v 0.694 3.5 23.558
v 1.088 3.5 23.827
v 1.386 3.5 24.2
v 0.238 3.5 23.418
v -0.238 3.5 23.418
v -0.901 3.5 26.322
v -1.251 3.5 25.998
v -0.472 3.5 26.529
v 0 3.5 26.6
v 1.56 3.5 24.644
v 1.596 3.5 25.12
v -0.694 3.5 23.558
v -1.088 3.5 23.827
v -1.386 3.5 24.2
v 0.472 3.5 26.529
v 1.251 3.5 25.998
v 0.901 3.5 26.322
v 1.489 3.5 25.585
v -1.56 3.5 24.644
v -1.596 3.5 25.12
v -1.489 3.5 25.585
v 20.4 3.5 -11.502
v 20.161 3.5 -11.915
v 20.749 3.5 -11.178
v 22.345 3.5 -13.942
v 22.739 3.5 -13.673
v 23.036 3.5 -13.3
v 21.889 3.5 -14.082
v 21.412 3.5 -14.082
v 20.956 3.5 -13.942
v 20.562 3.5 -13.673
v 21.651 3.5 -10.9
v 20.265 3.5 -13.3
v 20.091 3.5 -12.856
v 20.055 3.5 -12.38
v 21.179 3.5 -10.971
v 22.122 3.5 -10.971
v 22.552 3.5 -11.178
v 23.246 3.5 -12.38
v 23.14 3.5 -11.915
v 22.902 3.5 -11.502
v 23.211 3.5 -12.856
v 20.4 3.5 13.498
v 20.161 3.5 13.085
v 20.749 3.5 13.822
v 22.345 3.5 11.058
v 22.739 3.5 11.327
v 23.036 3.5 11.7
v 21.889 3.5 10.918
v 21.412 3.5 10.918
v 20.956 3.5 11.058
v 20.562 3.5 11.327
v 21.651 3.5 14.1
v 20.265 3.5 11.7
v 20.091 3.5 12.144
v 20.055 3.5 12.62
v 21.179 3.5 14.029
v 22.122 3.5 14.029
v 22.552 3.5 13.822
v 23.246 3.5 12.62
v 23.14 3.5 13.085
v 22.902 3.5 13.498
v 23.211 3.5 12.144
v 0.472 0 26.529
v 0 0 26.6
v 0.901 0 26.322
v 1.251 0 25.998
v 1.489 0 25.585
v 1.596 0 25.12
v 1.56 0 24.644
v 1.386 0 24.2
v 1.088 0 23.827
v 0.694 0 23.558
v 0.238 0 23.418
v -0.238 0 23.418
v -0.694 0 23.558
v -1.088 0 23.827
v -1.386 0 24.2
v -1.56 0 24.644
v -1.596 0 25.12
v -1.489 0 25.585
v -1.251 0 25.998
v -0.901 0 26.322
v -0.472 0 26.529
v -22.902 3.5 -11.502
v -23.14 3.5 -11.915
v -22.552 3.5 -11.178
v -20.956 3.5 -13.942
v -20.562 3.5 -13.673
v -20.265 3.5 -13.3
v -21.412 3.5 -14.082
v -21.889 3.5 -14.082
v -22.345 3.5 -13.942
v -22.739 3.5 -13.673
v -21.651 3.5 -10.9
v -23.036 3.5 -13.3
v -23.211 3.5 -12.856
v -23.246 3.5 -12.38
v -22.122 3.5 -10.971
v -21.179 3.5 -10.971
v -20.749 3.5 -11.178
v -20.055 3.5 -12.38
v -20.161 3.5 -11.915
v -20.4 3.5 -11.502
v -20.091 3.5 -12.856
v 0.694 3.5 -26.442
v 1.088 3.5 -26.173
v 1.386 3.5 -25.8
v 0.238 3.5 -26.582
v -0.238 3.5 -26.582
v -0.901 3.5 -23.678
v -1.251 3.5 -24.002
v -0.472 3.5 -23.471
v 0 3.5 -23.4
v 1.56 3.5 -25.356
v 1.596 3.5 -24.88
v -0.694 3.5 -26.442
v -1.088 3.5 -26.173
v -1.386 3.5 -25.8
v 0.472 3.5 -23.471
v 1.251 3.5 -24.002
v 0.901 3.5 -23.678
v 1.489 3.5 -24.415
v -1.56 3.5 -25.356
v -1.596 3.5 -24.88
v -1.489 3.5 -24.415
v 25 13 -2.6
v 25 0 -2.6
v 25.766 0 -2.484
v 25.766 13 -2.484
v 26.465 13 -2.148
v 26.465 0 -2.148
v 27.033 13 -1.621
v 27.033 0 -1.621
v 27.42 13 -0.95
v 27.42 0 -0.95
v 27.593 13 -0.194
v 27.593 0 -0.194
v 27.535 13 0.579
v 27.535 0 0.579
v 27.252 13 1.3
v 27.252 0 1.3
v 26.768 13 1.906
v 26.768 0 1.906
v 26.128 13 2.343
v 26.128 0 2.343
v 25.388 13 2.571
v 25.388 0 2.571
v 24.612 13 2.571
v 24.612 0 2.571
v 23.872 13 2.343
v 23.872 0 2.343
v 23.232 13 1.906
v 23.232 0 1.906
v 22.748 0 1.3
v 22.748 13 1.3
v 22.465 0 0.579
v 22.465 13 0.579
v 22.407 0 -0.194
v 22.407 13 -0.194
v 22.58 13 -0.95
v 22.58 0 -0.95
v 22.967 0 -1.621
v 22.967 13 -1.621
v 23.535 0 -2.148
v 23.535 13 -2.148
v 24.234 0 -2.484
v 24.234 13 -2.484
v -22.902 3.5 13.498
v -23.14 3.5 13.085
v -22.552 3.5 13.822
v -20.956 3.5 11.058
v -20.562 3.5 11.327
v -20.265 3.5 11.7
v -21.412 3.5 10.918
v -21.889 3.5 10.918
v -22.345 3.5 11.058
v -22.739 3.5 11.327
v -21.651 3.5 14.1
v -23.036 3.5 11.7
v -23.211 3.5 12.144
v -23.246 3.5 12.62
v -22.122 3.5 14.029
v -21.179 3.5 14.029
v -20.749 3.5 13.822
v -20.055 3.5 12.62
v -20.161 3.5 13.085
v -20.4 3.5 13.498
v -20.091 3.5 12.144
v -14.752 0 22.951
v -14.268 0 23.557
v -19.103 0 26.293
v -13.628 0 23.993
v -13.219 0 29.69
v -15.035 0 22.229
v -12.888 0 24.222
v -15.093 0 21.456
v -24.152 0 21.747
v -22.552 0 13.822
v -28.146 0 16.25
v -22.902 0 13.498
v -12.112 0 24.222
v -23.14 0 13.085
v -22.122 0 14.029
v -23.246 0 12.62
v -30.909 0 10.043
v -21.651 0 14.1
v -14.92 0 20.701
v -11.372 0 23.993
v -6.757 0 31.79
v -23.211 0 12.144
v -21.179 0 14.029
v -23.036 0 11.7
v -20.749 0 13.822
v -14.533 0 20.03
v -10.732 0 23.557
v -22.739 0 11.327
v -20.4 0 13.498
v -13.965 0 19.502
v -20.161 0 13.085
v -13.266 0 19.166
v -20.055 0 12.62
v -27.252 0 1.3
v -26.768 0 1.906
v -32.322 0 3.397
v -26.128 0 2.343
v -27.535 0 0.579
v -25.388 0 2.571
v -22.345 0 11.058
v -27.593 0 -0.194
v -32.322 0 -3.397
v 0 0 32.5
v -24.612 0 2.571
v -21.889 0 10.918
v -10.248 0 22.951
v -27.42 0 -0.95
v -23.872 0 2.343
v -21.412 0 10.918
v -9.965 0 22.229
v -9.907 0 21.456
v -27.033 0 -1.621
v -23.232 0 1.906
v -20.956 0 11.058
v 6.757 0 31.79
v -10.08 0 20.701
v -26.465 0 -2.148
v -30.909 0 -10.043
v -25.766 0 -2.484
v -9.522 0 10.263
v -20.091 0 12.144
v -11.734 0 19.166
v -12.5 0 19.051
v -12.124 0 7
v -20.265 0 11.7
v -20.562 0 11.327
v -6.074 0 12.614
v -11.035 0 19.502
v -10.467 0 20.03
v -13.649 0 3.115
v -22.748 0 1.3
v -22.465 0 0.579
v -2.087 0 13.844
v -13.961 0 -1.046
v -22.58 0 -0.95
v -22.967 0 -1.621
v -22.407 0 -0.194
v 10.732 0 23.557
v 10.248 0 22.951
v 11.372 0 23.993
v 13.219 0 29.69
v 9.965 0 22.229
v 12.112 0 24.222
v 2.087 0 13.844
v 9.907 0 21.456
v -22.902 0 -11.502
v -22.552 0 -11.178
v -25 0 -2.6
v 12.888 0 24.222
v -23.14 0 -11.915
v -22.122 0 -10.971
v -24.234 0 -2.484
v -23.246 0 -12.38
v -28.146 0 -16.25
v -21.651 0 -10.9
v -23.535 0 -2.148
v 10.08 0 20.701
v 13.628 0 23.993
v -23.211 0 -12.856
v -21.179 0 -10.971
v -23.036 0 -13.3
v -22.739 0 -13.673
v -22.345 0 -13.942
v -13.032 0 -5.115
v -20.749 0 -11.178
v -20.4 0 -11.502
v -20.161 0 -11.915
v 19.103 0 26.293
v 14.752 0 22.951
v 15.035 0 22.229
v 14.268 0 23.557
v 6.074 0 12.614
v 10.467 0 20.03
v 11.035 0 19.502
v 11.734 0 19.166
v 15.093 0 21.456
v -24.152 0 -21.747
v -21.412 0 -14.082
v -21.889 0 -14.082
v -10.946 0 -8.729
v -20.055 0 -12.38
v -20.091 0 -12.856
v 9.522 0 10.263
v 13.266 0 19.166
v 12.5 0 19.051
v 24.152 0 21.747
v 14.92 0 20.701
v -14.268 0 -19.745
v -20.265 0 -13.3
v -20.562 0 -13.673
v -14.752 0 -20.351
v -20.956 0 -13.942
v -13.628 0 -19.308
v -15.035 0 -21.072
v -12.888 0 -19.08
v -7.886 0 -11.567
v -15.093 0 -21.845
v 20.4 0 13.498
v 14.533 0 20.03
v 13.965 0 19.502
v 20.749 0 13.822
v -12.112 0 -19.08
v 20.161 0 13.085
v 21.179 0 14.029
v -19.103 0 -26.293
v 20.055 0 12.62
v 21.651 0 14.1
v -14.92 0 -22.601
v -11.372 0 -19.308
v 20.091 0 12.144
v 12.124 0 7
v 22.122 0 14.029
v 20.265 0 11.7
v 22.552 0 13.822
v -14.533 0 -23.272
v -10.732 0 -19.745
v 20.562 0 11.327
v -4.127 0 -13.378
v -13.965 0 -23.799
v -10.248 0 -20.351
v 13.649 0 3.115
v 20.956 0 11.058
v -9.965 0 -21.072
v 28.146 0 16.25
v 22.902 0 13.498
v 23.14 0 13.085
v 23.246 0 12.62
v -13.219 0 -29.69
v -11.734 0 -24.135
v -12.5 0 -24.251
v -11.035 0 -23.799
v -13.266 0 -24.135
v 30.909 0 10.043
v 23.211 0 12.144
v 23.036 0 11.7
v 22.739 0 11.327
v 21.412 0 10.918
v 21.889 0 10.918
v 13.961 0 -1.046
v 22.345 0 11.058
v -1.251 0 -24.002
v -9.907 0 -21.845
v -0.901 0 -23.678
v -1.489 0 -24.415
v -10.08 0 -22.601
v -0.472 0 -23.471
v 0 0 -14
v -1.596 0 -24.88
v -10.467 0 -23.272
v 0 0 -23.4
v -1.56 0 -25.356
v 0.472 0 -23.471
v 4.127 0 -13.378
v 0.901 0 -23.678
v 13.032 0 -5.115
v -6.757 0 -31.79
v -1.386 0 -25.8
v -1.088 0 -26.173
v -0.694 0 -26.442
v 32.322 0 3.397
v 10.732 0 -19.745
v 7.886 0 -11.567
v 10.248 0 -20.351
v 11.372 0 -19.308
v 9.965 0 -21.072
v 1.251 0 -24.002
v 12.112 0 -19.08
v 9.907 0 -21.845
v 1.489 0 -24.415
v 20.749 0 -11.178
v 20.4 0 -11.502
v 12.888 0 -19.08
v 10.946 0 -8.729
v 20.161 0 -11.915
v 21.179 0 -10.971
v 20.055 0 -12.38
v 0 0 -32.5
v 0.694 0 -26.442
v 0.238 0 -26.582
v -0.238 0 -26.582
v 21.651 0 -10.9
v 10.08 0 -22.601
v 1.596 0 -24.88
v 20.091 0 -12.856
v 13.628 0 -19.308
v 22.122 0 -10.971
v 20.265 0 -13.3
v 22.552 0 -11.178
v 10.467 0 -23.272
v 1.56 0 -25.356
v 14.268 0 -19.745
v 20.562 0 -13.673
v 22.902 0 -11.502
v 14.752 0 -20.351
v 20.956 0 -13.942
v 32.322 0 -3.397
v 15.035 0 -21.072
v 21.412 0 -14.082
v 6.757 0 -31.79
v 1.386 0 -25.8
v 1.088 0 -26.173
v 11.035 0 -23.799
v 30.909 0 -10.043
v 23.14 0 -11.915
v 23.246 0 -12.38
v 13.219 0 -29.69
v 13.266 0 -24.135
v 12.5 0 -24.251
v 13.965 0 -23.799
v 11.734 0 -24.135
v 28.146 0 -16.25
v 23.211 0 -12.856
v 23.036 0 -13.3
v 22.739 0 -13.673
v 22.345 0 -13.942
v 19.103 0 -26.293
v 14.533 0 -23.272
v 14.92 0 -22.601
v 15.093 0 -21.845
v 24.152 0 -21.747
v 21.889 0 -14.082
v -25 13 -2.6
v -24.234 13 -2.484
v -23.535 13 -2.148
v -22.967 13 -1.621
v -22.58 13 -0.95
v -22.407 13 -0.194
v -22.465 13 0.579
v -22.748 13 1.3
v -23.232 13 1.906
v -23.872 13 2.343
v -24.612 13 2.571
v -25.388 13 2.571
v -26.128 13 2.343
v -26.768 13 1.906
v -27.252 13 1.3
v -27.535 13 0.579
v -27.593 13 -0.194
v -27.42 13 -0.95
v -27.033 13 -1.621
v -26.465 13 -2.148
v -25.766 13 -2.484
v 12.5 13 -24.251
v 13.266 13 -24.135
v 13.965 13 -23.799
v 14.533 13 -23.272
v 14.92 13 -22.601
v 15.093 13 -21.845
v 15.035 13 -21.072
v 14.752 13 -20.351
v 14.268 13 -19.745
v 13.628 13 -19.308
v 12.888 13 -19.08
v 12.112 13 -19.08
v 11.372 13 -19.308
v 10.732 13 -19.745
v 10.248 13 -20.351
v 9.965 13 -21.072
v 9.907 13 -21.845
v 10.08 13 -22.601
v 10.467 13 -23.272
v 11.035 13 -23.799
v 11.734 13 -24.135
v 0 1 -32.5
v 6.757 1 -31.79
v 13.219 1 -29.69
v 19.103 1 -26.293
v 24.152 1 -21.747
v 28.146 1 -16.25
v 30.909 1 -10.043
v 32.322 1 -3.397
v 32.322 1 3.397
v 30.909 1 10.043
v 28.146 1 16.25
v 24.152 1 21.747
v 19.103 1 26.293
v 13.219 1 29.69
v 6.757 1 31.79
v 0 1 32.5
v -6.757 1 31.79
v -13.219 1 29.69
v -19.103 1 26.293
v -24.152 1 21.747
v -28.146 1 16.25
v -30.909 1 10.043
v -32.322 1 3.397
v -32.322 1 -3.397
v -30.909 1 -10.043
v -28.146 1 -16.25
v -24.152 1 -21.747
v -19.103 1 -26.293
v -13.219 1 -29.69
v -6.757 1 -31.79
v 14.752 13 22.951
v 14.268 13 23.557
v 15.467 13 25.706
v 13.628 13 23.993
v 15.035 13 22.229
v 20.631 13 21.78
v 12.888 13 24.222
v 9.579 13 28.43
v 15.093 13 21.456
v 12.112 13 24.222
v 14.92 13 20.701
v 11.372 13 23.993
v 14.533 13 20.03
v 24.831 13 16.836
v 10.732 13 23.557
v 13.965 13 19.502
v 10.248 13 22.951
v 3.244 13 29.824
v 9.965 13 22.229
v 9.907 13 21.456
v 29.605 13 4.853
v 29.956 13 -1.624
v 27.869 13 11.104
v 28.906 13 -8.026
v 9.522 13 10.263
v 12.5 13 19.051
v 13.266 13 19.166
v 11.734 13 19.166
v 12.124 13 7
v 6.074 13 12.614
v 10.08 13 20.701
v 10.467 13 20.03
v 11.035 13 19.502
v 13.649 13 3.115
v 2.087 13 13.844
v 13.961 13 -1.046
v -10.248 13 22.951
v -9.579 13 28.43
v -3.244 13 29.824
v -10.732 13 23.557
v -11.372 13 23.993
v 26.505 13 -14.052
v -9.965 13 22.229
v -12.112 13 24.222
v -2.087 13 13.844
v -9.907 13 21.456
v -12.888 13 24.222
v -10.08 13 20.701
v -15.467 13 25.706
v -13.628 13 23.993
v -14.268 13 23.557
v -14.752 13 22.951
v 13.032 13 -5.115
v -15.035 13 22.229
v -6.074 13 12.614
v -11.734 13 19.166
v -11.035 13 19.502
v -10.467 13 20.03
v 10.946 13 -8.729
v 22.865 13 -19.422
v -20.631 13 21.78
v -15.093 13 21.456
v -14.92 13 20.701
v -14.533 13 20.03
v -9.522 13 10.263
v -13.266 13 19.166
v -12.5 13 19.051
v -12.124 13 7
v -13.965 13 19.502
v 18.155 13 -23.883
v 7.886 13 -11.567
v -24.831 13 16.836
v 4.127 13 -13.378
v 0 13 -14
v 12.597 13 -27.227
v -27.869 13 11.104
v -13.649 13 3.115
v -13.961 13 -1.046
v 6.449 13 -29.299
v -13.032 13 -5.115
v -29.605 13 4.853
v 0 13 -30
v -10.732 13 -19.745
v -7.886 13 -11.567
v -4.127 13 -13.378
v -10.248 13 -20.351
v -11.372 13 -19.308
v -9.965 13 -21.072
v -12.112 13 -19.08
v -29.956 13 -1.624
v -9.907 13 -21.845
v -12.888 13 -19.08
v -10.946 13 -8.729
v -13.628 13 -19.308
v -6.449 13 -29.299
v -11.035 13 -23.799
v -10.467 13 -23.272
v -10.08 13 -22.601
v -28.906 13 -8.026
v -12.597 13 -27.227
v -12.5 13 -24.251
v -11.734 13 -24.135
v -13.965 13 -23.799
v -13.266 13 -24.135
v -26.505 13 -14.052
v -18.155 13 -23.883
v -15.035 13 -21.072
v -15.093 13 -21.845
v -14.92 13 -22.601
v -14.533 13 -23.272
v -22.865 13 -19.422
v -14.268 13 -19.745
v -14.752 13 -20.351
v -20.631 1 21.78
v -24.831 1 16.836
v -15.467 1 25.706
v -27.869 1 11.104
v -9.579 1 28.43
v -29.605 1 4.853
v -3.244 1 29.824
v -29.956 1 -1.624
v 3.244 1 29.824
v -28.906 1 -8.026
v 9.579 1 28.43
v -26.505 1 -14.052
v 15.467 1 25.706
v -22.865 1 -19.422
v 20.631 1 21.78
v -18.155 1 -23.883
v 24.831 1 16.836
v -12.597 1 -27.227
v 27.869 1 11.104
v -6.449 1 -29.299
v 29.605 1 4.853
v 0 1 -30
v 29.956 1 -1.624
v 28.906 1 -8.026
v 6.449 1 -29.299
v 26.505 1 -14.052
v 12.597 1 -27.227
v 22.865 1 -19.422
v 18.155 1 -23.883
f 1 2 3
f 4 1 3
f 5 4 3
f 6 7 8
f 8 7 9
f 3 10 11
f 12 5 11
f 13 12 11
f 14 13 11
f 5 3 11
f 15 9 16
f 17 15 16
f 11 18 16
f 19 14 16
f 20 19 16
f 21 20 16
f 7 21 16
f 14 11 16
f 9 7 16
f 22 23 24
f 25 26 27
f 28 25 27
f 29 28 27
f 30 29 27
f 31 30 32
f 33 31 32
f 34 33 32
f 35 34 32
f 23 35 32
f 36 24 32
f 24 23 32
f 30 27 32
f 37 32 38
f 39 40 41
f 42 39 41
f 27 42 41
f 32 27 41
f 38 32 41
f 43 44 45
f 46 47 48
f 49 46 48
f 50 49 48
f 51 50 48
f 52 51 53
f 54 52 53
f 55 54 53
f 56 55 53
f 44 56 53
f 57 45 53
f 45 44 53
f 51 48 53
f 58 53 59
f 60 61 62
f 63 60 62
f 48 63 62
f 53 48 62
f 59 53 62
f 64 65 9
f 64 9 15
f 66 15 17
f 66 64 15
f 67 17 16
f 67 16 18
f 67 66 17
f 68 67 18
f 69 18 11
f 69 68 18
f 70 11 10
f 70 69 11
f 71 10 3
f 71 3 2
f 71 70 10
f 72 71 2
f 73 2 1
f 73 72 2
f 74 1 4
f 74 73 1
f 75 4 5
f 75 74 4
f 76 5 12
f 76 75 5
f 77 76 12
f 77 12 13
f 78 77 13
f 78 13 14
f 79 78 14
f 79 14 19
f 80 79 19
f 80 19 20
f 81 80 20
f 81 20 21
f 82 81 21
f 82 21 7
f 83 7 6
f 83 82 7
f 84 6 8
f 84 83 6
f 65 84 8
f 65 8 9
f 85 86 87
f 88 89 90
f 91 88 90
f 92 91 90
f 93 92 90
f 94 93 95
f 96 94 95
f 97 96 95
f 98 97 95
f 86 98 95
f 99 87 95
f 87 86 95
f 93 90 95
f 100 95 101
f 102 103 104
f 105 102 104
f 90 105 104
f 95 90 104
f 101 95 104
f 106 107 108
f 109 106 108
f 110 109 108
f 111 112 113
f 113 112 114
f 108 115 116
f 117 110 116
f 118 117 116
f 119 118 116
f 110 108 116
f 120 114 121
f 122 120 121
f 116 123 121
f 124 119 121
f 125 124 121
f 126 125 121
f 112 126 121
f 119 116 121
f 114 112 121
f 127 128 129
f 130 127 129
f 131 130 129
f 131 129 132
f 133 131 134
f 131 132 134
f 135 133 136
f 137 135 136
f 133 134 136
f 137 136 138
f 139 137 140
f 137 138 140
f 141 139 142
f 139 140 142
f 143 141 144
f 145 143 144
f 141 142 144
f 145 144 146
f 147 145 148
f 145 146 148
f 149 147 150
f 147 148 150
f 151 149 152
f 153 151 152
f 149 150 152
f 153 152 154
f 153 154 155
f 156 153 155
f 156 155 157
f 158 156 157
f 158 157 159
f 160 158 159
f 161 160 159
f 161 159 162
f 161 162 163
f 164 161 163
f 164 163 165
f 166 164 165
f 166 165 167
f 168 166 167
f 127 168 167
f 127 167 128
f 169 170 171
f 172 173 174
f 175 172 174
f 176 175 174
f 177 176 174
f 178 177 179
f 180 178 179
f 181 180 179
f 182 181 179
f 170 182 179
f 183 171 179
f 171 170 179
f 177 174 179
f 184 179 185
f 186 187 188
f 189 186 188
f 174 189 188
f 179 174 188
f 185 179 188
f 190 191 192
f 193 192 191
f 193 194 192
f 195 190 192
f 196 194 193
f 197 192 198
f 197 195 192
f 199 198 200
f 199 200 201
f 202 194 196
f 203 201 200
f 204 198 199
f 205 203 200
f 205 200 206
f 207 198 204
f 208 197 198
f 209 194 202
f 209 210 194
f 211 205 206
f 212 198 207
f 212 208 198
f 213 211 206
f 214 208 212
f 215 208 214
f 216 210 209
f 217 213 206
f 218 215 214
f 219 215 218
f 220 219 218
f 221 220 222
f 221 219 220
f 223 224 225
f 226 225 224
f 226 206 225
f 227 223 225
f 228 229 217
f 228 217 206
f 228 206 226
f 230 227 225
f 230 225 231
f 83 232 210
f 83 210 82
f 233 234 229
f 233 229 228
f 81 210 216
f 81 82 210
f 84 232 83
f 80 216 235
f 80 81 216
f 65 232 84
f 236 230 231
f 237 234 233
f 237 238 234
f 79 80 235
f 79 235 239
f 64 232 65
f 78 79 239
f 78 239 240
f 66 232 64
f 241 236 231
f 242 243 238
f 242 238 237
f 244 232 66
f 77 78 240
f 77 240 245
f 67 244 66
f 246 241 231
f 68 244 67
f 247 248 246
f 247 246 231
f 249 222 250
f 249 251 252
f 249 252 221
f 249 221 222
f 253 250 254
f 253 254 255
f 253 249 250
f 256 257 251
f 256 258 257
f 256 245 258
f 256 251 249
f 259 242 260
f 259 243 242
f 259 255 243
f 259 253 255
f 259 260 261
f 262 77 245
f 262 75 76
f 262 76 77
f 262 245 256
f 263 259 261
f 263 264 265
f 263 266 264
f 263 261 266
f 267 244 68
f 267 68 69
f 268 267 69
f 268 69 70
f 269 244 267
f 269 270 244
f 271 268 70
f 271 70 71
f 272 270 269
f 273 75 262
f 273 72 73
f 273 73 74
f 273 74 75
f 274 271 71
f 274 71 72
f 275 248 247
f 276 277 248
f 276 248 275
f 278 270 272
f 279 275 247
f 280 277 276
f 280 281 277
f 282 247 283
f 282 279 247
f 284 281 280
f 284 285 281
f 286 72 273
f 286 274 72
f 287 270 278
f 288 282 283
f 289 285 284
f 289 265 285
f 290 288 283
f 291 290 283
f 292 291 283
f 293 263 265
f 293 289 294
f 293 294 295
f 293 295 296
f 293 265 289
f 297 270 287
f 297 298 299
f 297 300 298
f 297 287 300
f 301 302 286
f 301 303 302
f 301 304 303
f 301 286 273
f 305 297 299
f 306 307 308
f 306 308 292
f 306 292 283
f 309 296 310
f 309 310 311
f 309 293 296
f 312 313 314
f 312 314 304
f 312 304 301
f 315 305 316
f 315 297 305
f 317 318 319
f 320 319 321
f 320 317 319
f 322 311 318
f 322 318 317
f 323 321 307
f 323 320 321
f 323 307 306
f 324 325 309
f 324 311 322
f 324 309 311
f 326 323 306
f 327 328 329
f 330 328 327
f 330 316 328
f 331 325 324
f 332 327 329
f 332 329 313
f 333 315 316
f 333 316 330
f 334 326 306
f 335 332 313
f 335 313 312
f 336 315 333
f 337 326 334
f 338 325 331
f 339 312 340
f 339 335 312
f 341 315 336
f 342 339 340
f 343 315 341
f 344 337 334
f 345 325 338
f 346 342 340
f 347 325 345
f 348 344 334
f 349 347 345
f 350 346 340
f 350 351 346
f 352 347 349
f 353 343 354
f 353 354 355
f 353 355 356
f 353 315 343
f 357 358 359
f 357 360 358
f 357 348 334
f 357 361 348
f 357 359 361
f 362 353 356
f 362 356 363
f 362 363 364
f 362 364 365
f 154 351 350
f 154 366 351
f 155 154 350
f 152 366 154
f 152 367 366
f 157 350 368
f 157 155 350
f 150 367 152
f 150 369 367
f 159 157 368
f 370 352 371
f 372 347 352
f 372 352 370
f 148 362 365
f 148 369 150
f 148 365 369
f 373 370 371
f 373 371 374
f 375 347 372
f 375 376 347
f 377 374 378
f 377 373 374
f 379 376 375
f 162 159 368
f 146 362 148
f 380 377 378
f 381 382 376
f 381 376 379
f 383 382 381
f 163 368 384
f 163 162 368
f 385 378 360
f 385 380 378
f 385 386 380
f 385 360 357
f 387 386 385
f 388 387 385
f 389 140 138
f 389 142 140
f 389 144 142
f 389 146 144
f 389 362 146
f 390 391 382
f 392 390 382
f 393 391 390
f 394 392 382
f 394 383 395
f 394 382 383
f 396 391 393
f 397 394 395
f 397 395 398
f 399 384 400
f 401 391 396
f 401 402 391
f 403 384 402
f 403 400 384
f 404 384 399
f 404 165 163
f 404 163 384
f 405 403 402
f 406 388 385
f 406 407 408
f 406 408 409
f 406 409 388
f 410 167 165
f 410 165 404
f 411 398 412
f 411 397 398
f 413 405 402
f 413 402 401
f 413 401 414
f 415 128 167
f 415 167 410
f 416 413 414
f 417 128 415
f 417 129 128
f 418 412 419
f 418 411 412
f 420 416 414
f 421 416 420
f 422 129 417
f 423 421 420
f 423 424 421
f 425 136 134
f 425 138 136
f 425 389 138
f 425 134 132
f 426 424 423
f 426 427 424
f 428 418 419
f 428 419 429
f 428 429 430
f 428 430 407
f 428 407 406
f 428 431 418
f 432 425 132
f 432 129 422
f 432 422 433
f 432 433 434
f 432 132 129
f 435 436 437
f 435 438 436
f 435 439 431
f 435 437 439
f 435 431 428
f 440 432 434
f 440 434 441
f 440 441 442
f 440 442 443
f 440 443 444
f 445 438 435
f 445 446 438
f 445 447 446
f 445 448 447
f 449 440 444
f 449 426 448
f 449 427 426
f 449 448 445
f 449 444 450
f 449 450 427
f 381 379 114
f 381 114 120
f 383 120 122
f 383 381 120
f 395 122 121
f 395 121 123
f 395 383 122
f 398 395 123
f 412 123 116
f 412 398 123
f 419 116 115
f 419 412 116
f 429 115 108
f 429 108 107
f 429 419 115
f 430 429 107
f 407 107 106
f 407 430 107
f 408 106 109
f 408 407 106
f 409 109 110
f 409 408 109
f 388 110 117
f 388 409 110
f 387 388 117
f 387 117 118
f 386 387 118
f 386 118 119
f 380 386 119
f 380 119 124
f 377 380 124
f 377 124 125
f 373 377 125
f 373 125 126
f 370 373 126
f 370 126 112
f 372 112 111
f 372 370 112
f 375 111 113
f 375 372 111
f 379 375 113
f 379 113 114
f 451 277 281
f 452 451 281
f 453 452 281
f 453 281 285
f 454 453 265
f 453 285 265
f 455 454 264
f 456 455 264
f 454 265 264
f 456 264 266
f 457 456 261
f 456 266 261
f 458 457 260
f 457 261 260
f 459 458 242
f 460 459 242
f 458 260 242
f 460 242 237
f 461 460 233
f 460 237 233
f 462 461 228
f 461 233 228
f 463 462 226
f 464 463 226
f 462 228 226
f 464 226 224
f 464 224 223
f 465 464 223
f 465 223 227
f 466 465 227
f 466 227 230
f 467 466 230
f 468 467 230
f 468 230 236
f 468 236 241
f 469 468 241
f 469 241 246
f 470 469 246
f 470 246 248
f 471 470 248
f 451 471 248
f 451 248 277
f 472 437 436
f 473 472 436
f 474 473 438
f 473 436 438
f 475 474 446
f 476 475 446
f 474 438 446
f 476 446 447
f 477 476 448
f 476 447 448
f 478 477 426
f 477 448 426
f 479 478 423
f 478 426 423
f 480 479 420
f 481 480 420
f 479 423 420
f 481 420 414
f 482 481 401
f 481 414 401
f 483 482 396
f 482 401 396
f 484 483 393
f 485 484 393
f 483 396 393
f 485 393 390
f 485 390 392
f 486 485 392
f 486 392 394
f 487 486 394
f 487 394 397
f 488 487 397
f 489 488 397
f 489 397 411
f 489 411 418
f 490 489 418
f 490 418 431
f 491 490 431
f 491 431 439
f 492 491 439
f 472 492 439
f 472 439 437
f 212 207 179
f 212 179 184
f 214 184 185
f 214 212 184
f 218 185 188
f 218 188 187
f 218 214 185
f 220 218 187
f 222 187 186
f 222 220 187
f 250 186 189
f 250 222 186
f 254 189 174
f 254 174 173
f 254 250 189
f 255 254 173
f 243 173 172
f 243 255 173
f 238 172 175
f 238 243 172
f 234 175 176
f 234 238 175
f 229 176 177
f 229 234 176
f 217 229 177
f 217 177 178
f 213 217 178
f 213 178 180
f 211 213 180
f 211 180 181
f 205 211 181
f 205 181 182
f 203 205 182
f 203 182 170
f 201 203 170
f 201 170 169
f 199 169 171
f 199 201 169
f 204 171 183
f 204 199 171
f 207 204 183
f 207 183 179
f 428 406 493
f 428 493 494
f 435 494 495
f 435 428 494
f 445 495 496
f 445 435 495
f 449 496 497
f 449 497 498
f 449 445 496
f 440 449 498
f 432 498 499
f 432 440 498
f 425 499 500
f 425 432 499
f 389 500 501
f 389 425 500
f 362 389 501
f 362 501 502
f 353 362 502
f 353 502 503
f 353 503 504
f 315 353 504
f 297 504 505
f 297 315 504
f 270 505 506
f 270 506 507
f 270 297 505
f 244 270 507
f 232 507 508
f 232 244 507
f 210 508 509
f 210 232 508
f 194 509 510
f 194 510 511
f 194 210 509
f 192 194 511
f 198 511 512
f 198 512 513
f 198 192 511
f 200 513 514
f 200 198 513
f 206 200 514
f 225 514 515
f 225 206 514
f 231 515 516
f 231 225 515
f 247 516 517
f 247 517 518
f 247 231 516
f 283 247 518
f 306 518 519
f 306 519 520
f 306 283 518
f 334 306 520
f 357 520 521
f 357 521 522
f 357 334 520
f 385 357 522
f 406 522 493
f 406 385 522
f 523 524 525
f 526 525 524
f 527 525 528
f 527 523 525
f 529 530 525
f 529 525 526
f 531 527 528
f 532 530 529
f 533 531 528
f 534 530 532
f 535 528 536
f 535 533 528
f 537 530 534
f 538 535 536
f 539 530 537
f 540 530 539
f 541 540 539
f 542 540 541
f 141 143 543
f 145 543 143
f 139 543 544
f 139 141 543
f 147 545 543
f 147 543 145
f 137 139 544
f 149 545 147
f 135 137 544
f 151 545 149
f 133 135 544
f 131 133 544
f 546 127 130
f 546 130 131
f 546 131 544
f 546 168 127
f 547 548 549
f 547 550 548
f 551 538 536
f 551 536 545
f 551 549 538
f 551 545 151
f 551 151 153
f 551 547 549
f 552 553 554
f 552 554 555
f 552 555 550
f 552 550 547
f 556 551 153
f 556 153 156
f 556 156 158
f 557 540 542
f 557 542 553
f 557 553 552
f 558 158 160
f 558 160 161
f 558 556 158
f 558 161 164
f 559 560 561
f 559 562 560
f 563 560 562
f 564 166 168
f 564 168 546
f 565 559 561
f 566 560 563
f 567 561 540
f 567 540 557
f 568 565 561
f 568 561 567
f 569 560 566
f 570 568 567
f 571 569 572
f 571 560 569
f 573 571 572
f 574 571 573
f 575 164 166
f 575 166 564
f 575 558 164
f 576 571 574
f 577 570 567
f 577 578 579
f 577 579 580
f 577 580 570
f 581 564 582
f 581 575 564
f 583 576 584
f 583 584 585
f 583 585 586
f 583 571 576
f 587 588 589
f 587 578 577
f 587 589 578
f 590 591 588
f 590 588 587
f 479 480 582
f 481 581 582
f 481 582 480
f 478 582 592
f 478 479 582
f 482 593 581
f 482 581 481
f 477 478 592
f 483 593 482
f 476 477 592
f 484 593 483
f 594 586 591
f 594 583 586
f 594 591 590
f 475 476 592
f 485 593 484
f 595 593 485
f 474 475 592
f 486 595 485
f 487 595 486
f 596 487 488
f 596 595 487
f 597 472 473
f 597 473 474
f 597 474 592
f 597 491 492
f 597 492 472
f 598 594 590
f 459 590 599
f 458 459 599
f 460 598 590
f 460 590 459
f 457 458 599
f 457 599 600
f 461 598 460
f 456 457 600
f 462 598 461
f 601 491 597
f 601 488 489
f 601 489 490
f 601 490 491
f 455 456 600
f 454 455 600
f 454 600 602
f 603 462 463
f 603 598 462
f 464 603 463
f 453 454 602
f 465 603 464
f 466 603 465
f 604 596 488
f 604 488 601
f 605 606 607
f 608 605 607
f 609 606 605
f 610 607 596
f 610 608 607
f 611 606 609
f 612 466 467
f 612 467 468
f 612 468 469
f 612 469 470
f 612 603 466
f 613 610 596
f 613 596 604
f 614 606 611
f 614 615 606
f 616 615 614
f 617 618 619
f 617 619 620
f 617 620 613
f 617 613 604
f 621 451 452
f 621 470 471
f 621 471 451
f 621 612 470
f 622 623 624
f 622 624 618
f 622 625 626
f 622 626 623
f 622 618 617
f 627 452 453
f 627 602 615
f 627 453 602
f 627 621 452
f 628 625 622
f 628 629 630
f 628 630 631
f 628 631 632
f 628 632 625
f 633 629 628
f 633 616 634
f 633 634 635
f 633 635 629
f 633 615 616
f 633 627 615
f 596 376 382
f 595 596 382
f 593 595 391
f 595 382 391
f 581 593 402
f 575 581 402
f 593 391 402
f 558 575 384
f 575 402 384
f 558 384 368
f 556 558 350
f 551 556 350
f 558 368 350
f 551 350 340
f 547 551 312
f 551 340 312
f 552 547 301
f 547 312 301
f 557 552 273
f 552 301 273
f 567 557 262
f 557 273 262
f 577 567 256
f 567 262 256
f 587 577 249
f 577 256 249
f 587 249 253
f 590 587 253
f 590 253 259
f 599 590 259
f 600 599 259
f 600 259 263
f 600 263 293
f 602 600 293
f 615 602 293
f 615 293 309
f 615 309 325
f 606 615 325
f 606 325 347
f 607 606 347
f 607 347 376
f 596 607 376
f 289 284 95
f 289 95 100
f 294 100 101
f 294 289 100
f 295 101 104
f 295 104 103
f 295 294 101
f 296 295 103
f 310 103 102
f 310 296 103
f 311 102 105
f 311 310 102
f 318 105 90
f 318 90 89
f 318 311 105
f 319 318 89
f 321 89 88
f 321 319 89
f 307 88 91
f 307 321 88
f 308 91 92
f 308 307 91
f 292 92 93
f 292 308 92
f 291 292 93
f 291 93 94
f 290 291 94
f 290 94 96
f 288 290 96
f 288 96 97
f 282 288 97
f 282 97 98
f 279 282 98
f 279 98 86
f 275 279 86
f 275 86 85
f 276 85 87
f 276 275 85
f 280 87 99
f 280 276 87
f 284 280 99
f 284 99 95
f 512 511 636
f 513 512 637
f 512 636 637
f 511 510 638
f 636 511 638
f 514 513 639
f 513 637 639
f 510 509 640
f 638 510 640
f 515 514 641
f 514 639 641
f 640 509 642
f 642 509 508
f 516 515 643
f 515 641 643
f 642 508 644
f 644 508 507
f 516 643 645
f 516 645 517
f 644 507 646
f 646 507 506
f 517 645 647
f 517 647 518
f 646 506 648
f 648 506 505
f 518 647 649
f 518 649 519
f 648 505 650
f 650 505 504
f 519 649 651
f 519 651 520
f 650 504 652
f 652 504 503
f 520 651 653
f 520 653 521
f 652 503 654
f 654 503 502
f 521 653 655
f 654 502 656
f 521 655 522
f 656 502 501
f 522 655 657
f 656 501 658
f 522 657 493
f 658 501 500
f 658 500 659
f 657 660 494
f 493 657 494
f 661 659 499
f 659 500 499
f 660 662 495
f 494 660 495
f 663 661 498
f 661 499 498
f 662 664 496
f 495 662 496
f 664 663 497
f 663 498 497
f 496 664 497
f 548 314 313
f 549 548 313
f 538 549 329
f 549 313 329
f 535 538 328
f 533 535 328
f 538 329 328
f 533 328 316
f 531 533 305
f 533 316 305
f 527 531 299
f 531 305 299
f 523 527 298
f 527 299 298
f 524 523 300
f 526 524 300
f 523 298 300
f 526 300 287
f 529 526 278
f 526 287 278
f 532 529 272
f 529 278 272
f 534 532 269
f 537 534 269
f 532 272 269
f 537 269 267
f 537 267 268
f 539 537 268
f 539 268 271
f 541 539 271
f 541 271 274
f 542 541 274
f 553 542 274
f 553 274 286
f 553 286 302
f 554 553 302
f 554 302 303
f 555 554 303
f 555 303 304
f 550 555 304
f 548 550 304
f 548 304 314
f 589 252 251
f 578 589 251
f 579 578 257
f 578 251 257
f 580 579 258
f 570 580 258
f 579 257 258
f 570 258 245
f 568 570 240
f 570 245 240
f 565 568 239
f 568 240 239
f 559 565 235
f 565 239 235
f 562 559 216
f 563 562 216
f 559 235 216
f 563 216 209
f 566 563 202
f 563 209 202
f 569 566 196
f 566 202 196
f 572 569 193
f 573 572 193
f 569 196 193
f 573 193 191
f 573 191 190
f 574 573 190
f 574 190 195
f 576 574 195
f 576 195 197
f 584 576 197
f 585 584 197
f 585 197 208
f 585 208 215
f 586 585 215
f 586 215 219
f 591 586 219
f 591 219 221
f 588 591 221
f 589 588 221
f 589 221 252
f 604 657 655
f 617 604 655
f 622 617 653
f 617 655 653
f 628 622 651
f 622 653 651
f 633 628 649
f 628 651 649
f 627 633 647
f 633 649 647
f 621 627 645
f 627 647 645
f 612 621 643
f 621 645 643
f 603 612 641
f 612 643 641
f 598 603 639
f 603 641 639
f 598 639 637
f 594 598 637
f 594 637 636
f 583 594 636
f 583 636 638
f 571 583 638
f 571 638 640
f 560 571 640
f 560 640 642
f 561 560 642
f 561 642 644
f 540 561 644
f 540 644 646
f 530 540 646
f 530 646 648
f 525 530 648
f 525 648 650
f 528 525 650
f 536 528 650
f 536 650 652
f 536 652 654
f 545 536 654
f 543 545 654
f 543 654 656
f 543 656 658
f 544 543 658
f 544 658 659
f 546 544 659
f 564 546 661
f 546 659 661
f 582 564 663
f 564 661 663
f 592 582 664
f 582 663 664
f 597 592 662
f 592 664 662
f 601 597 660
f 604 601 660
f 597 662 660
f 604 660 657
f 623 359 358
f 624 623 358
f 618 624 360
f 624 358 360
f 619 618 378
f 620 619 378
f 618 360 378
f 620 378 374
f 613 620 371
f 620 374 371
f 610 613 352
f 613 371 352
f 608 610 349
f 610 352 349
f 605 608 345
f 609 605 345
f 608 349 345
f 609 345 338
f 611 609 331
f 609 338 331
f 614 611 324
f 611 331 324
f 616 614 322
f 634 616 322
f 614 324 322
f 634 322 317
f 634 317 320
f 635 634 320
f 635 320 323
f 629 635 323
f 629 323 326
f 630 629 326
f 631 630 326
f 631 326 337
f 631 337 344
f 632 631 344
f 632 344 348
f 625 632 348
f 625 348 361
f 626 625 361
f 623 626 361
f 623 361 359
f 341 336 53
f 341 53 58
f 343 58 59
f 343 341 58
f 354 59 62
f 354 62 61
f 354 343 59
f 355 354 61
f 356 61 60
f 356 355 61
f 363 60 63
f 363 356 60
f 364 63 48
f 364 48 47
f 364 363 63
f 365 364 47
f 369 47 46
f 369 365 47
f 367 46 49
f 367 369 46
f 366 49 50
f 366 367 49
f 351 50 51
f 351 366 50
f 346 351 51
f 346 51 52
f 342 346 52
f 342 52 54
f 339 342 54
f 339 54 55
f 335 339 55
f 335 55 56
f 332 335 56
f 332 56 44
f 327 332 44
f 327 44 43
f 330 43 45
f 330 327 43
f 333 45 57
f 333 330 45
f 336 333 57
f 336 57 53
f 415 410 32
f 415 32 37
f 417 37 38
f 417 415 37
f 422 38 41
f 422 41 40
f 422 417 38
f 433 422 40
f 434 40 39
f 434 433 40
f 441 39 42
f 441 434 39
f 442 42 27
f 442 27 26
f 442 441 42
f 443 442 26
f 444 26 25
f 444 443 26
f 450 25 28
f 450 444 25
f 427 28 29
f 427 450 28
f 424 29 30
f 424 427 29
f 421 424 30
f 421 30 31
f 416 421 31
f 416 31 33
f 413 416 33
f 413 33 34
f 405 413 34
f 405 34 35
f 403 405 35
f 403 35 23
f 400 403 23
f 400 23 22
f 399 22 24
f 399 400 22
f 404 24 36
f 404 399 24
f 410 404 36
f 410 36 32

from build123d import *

# Parameters (mm, degrees)
SKETCH1_R           = 30
BOSS_EXTRUDE1_DEPTH = 13
SKETCH2_R           = 32.5
BOSS_EXTRUDE2_DEPTH = 1
SKETCH3_R           = 1.6
CUT_EXTRUDE1_DEPTH  = 3.5
SKETCH4_R           = 14
CUT_EXTRUDE2_DEPTH  = 51
SKETCH5_R           = 2.6
CUT_EXTRUDE3_DEPTH  = 25


with BuildPart() as part:
    # Sketch1 → Boss-Extrude1 (new body)
    with BuildSketch(Plane(origin=(0, 0, 0), x_dir=(1, 0, 0), z_dir=(0, 1, 0))):
        with Locations(Location((0, 0, 0), (0, 0, 90))):
            Circle(SKETCH1_R)
    extrude(amount=BOSS_EXTRUDE1_DEPTH)

    # Sketch2 → Boss-Extrude2 (add)
    with BuildSketch(Plane.XZ):
        with Locations(Location((0, 0, 0), (0, 0, 270))):
            Circle(SKETCH2_R)
    extrude(amount=-BOSS_EXTRUDE2_DEPTH)

    # Sketch3 → Cut-Extrude1 (cut)
    with BuildSketch(Plane(origin=(0, 0, 0), x_dir=(1, 0, 0), z_dir=(0, 1, 0))):
        with Locations(Location((0, 25, 0), (0, 0, 270))):
            Circle(SKETCH3_R)
        with Locations(Location((21.650635095, 12.5, 0), (0, 0, 270))):
            Circle(SKETCH3_R)
        with Locations(Location((21.650635095, -12.5, 0), (0, 0, 270))):
            Circle(SKETCH3_R)
        with Locations(Location((0, -25, 0), (0, 0, 270))):
            Circle(SKETCH3_R)
        with Locations(Location((-21.650635095, -12.5, 0), (0, 0, 270))):
            Circle(SKETCH3_R)
        with Locations(Location((-21.650635095, 12.5, 0), (0, 0, 270))):
            Circle(SKETCH3_R)
    extrude(amount=CUT_EXTRUDE1_DEPTH, mode=Mode.SUBTRACT)

    # Sketch4 → Cut-Extrude2 (cut)
    with BuildSketch(Plane.XZ):
        with Locations(Location((0, 0, 0), (0, 0, 270))):
            Circle(SKETCH4_R)
    extrude(amount=-CUT_EXTRUDE2_DEPTH, mode=Mode.SUBTRACT)

    # Sketch5 → Cut-Extrude3 (cut)
    with BuildSketch(Plane.XZ):
        with Locations(Location((-12.5, 21.650635095, 0), (0, 0, 270))):
            Circle(SKETCH5_R)
        with Locations(Location((12.5, 21.650635095, 0), (0, 0, 270))):
            Circle(SKETCH5_R)
        with Locations(Location((25, 0, 0), (0, 0, 270))):
            Circle(SKETCH5_R)
        with Locations(Location((12.5, -21.650635095, 0), (0, 0, 270))):
            Circle(SKETCH5_R)
        with Locations(Location((-12.5, -21.650635095, 0), (0, 0, 270))):
            Circle(SKETCH5_R)
        with Locations(Location((-25, 0, 0), (0, 0, 270))):
            Circle(SKETCH5_R)
    extrude(amount=-CUT_EXTRUDE3_DEPTH, mode=Mode.SUBTRACT)


solid = part.part
